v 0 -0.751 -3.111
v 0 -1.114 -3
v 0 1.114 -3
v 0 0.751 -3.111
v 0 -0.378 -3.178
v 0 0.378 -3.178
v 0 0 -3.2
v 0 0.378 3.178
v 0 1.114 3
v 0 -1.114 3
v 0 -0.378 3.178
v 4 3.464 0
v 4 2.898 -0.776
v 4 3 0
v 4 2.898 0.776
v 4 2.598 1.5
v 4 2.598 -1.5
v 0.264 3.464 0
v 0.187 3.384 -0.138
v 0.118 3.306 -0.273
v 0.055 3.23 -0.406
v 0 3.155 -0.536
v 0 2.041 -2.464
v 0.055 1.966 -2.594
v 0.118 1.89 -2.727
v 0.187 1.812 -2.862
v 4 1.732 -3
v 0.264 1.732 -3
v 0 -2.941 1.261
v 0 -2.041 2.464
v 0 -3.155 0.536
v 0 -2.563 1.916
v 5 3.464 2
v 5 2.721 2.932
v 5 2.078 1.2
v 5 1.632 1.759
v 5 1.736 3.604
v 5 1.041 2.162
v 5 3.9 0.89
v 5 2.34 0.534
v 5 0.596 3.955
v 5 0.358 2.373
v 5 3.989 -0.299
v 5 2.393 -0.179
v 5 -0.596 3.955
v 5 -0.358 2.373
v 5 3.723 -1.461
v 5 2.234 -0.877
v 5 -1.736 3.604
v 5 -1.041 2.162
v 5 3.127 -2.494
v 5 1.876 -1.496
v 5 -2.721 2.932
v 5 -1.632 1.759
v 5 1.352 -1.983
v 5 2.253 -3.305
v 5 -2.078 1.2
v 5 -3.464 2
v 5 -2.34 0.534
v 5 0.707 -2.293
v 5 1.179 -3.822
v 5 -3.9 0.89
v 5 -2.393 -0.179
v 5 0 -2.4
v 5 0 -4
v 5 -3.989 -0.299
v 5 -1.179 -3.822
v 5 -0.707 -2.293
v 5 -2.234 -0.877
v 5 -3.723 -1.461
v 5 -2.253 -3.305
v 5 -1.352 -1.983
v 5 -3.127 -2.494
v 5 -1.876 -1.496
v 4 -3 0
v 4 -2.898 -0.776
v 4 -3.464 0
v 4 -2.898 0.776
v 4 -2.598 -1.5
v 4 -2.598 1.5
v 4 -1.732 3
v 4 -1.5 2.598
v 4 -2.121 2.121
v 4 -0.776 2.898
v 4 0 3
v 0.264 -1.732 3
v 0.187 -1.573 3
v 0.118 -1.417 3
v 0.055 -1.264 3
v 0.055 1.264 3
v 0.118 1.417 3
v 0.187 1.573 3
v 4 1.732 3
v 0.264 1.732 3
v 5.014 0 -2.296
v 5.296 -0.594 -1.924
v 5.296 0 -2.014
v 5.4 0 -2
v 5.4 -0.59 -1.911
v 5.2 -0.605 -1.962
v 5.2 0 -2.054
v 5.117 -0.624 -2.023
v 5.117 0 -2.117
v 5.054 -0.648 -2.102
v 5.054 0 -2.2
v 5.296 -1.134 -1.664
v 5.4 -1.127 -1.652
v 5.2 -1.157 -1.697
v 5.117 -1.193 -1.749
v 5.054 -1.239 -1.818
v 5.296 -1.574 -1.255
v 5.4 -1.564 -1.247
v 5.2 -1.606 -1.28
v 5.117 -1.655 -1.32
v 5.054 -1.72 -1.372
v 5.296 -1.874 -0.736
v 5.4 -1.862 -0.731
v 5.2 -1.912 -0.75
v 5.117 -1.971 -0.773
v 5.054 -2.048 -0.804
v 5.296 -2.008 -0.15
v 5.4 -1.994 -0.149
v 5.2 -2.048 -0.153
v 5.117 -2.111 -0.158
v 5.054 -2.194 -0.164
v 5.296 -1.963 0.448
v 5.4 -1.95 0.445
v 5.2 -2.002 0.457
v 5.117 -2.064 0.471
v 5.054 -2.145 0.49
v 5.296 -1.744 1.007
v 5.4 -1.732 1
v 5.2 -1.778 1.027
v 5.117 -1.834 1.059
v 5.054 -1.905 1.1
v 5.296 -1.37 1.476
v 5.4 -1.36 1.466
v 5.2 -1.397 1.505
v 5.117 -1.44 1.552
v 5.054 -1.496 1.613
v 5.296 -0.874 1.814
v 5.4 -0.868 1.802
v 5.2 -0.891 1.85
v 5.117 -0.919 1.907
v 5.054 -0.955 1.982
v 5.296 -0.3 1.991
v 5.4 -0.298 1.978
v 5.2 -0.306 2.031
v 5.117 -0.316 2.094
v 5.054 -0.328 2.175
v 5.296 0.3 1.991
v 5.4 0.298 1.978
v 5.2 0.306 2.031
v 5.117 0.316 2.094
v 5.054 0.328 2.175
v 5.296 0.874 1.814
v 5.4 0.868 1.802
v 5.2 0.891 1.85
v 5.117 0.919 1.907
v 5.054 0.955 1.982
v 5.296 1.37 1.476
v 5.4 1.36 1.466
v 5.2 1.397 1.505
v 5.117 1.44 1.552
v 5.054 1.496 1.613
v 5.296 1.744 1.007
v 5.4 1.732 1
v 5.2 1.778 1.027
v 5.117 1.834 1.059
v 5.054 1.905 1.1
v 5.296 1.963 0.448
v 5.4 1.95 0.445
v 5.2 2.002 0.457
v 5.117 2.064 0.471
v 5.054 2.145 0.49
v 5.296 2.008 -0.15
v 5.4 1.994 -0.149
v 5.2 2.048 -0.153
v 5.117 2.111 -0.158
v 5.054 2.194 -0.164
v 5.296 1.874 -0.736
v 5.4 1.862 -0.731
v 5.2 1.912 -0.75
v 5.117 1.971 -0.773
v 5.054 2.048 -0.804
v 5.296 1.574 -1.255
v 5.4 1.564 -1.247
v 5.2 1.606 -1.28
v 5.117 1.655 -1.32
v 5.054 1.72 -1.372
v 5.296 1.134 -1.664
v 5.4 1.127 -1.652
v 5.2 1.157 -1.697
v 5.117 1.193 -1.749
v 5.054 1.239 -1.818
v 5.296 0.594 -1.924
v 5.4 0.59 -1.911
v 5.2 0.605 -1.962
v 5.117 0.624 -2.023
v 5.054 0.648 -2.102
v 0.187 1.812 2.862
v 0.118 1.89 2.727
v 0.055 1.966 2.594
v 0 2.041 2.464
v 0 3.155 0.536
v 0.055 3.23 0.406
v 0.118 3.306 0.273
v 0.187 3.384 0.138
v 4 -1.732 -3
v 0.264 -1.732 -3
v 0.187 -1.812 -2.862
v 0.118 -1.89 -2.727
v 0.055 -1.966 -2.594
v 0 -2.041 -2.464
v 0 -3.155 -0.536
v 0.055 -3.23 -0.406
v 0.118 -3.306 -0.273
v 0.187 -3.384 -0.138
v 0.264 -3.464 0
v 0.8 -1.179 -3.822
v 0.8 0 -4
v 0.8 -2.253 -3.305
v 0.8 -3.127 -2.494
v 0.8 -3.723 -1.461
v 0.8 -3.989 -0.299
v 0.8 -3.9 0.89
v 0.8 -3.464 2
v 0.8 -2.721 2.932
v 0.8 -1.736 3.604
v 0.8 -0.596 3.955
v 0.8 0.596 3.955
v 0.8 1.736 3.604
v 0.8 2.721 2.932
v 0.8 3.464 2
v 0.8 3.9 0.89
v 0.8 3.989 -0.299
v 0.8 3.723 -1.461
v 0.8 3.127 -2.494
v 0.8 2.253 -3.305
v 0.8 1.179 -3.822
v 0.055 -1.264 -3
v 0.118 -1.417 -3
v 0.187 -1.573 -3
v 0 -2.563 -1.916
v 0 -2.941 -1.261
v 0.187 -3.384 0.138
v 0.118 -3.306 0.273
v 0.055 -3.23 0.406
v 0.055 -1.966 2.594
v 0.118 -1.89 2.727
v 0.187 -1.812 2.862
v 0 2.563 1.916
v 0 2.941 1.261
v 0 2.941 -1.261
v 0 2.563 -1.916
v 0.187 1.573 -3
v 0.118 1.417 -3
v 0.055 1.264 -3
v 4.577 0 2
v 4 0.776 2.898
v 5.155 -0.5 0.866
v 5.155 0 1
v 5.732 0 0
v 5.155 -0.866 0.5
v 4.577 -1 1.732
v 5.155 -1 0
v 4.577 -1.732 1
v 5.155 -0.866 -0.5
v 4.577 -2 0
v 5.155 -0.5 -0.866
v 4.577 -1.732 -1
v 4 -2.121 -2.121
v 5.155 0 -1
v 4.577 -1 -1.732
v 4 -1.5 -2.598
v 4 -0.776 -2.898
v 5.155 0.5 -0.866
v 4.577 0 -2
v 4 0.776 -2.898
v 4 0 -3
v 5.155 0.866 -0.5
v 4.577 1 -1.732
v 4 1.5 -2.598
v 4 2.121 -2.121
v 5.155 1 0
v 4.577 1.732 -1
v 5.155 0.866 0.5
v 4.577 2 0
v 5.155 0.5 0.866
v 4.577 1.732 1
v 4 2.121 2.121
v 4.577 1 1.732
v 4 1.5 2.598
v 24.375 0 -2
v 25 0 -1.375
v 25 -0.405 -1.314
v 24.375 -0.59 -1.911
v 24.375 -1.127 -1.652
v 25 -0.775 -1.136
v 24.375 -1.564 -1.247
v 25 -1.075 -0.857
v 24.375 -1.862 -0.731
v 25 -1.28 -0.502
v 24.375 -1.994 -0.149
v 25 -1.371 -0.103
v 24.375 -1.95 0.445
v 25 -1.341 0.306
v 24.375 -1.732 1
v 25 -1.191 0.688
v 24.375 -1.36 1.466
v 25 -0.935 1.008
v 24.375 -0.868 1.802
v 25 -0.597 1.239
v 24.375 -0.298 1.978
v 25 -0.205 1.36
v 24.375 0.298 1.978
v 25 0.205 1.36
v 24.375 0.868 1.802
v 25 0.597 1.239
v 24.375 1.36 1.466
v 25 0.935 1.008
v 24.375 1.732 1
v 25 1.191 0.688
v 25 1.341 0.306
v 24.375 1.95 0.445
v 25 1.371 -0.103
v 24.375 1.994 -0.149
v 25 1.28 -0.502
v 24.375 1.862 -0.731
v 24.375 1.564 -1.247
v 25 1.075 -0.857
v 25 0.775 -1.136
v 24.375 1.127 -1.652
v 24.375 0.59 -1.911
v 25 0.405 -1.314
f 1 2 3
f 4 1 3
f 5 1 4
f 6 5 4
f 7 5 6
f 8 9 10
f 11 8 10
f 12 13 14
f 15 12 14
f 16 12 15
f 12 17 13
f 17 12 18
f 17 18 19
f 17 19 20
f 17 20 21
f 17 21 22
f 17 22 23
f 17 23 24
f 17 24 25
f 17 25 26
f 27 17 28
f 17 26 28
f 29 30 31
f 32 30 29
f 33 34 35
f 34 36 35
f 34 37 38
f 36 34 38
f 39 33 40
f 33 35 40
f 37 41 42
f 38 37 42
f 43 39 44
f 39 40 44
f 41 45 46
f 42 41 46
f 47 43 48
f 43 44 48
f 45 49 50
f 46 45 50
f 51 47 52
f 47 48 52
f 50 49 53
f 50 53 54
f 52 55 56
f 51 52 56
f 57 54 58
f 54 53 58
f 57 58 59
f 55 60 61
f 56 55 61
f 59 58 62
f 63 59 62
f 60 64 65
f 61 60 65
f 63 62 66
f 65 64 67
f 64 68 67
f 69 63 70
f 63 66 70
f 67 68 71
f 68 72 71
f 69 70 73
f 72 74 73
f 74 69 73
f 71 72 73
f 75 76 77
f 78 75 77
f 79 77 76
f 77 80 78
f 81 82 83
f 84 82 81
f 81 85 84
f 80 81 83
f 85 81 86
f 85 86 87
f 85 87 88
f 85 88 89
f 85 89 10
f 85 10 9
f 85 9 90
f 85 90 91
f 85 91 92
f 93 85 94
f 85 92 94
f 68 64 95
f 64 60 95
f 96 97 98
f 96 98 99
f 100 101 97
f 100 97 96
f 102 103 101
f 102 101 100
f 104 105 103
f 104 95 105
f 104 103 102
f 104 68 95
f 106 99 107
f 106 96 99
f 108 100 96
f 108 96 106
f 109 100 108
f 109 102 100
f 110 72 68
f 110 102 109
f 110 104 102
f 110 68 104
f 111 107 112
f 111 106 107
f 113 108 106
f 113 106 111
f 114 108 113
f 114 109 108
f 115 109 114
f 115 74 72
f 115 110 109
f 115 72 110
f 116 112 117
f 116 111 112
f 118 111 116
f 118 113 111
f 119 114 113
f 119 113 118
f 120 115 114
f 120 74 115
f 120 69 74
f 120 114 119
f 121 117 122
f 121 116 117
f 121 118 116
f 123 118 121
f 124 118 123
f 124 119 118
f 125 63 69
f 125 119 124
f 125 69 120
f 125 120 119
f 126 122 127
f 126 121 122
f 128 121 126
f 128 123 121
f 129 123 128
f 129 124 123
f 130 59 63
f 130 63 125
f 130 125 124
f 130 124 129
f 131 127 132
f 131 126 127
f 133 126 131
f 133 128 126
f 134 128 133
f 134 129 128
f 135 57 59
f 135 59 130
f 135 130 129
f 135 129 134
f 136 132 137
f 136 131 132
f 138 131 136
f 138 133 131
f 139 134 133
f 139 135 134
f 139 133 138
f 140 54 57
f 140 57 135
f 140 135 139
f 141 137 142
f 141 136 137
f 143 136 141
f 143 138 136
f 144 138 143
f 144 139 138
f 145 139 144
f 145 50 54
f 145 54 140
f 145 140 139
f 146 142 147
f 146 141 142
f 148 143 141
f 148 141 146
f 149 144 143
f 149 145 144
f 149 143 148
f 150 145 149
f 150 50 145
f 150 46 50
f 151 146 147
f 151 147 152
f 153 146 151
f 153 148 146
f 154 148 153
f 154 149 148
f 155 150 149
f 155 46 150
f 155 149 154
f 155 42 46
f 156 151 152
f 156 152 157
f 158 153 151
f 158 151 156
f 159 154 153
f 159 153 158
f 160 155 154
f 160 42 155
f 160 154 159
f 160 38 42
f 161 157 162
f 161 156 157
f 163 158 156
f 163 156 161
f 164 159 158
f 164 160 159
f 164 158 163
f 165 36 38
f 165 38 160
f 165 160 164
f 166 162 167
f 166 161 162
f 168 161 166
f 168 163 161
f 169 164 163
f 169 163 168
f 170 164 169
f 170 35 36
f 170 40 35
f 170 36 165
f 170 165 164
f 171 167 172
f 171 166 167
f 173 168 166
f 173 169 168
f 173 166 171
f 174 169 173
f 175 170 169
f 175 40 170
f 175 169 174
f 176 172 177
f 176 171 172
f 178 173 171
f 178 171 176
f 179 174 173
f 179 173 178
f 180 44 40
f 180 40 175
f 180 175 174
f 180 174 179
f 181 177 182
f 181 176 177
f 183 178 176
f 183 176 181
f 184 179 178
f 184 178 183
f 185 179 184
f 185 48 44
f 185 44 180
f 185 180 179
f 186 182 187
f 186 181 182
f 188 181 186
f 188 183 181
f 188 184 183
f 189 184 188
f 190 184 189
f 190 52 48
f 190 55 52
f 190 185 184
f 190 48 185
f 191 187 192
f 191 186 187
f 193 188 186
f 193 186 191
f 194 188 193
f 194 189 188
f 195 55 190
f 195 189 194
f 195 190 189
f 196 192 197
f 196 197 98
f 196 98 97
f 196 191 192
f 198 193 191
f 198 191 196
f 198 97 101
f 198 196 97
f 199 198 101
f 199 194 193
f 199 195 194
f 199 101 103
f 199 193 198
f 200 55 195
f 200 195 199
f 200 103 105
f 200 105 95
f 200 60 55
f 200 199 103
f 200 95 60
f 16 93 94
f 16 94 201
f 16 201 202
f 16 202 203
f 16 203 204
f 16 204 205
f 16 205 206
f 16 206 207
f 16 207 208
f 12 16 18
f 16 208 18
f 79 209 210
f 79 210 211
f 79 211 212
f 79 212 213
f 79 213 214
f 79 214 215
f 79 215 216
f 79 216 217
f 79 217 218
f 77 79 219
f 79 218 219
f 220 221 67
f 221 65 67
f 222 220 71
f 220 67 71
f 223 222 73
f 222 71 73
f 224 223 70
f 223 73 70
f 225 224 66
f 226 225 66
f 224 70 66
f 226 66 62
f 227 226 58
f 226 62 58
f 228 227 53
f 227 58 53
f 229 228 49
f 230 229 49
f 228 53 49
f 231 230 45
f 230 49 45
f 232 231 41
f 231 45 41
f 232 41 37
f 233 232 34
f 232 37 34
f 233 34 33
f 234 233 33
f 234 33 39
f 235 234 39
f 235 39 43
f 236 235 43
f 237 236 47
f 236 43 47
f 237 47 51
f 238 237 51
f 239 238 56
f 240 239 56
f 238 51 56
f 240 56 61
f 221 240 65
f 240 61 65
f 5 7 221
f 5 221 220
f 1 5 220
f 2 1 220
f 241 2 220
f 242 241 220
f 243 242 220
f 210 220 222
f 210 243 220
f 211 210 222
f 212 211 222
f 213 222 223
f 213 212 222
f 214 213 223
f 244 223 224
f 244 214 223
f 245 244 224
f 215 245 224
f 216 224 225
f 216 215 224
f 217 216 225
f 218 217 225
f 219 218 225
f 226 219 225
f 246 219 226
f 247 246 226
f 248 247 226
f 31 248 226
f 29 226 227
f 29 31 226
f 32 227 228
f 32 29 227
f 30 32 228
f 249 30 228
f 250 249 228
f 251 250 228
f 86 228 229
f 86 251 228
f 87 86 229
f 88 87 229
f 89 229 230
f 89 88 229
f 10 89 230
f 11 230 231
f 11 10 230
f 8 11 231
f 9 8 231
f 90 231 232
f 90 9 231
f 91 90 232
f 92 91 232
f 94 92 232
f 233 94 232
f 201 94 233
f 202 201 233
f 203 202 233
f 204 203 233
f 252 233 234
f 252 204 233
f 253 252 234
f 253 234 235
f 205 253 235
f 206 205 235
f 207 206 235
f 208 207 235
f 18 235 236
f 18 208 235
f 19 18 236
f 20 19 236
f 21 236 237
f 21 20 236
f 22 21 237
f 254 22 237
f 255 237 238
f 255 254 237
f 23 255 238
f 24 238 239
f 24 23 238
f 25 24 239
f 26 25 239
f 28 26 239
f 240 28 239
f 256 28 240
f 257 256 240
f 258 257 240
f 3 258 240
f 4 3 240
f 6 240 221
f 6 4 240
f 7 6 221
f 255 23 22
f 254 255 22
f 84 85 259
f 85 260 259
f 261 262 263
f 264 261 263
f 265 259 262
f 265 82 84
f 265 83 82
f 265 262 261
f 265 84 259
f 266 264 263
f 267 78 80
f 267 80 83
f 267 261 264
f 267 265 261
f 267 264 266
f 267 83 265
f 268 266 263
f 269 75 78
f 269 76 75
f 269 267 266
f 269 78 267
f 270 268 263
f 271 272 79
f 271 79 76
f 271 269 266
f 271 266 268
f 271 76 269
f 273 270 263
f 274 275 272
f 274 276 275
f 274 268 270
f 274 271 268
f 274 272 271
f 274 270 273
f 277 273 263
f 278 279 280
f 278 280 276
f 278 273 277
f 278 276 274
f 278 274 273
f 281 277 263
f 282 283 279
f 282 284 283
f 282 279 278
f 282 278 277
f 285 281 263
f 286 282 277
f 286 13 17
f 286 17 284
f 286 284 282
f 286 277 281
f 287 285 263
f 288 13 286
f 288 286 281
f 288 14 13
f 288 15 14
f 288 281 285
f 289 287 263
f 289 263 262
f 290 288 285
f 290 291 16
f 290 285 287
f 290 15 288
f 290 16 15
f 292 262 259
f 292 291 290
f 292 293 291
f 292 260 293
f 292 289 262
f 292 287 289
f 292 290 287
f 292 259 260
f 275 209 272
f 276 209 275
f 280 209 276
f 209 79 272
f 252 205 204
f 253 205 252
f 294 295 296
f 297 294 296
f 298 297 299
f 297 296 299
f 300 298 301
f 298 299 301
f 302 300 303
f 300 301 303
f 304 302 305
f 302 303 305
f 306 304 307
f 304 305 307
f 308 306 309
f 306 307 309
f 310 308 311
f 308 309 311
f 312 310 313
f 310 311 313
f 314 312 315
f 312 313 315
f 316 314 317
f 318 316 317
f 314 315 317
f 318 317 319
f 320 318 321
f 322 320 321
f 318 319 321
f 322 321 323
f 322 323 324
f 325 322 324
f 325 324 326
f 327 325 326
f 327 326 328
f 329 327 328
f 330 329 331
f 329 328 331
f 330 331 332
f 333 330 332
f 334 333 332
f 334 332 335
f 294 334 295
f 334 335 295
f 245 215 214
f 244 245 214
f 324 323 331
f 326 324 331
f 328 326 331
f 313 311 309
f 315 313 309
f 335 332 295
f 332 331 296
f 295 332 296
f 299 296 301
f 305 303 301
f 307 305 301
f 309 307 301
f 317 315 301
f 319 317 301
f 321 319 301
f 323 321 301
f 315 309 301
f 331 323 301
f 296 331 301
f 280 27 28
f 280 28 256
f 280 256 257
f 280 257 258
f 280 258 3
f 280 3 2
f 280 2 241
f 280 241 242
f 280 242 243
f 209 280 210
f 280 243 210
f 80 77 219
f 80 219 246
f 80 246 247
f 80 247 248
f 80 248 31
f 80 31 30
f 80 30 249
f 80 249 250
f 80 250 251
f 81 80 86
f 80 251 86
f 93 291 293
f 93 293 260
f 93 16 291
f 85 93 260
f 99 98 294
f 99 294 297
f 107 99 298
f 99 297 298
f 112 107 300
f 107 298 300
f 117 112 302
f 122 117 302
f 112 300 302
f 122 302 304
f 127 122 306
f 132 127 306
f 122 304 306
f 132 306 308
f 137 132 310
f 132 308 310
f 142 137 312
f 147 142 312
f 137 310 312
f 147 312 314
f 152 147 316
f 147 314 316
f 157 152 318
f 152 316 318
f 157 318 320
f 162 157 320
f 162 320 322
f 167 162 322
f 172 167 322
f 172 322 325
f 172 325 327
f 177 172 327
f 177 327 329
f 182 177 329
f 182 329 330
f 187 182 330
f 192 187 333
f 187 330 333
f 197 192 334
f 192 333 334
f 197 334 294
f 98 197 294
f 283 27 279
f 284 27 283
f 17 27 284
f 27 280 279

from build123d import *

# Parameters (mm, degrees)
CHAMFER1_SIZE      = 0.625
CUT_EXTRUDE1_DEPTH = 4
CHAMFER2_SIZE      = 0.8
FILLET1_R          = 0.4


with BuildPart() as part:
    # Sketch1 → Revolve1 (revolve)
    with BuildSketch(Plane(origin=(0, 0, 0), x_dir=(1, 0, 0), z_dir=(0, 1, 0))):
        Polygon((0, 0), (0, 4), (5, 4), (5, 2), (25, 2), (25, 0), align=None)
    revolve(axis=Axis((25, 0, 0), (-1, 0, 0)))

    # Chamfer1
    chamfer1_edges = [part.edges().sort_by_distance(p)[0] for p in [
        (25, 0, 2),
    ]]
    chamfer(chamfer1_edges, length=CHAMFER1_SIZE)

    # Sketch3 → Cut-Revolve1 (revolve, cut)
    with BuildSketch(Plane(origin=(0, 0, 0), x_dir=(1, 0, 0), z_dir=(0, 1, 0)), mode=Mode.PRIVATE) as cut_revolve1_sk:
        Polygon((0, 0), (5.732050808, 0), (4, 3), (0, 3), align=None)
    revolve(cut_revolve1_sk.sketch.rotate(Axis((0, 0, 0), (1, 0, 0)), 180), axis=Axis((0, 0, 0), (1, 0, 0)), mode=Mode.SUBTRACT)

    # Sketch2 → Cut-Extrude1 (cut)
    with BuildSketch(Plane.ZY):
        Polygon((0, 3.464101615), (-3, 1.732050808), (-3, -1.732050808), (0, -3.464101615), (3, -1.732050808), (3, 1.732050808), align=None)
    extrude(amount=-CUT_EXTRUDE1_DEPTH, mode=Mode.SUBTRACT)

    # Chamfer2
    # the kernel refuses this chamfer: 0.8 mm, written as the material it takes off along each edge
    with BuildSketch(Plane(origin=(0, 0, 0), x_dir=(0, 0, -1), z_dir=(0, 1, 0))) as chamfer2_piece_1:
        Polygon((4, -CHAMFER2_SIZE), (4 - CHAMFER2_SIZE, 0), (4, 0), align=None)
    revolve(axis=Axis((0, 0, 0), (-1, 0, 0)), mode=Mode.SUBTRACT)

    # Fillet1
    fillet1_edges = [part.edges().sort_by_distance(p)[0] for p in [
        (5, 0, 2),
    ]]
    fillet(fillet1_edges, radius=FILLET1_R)


solid = part.part
